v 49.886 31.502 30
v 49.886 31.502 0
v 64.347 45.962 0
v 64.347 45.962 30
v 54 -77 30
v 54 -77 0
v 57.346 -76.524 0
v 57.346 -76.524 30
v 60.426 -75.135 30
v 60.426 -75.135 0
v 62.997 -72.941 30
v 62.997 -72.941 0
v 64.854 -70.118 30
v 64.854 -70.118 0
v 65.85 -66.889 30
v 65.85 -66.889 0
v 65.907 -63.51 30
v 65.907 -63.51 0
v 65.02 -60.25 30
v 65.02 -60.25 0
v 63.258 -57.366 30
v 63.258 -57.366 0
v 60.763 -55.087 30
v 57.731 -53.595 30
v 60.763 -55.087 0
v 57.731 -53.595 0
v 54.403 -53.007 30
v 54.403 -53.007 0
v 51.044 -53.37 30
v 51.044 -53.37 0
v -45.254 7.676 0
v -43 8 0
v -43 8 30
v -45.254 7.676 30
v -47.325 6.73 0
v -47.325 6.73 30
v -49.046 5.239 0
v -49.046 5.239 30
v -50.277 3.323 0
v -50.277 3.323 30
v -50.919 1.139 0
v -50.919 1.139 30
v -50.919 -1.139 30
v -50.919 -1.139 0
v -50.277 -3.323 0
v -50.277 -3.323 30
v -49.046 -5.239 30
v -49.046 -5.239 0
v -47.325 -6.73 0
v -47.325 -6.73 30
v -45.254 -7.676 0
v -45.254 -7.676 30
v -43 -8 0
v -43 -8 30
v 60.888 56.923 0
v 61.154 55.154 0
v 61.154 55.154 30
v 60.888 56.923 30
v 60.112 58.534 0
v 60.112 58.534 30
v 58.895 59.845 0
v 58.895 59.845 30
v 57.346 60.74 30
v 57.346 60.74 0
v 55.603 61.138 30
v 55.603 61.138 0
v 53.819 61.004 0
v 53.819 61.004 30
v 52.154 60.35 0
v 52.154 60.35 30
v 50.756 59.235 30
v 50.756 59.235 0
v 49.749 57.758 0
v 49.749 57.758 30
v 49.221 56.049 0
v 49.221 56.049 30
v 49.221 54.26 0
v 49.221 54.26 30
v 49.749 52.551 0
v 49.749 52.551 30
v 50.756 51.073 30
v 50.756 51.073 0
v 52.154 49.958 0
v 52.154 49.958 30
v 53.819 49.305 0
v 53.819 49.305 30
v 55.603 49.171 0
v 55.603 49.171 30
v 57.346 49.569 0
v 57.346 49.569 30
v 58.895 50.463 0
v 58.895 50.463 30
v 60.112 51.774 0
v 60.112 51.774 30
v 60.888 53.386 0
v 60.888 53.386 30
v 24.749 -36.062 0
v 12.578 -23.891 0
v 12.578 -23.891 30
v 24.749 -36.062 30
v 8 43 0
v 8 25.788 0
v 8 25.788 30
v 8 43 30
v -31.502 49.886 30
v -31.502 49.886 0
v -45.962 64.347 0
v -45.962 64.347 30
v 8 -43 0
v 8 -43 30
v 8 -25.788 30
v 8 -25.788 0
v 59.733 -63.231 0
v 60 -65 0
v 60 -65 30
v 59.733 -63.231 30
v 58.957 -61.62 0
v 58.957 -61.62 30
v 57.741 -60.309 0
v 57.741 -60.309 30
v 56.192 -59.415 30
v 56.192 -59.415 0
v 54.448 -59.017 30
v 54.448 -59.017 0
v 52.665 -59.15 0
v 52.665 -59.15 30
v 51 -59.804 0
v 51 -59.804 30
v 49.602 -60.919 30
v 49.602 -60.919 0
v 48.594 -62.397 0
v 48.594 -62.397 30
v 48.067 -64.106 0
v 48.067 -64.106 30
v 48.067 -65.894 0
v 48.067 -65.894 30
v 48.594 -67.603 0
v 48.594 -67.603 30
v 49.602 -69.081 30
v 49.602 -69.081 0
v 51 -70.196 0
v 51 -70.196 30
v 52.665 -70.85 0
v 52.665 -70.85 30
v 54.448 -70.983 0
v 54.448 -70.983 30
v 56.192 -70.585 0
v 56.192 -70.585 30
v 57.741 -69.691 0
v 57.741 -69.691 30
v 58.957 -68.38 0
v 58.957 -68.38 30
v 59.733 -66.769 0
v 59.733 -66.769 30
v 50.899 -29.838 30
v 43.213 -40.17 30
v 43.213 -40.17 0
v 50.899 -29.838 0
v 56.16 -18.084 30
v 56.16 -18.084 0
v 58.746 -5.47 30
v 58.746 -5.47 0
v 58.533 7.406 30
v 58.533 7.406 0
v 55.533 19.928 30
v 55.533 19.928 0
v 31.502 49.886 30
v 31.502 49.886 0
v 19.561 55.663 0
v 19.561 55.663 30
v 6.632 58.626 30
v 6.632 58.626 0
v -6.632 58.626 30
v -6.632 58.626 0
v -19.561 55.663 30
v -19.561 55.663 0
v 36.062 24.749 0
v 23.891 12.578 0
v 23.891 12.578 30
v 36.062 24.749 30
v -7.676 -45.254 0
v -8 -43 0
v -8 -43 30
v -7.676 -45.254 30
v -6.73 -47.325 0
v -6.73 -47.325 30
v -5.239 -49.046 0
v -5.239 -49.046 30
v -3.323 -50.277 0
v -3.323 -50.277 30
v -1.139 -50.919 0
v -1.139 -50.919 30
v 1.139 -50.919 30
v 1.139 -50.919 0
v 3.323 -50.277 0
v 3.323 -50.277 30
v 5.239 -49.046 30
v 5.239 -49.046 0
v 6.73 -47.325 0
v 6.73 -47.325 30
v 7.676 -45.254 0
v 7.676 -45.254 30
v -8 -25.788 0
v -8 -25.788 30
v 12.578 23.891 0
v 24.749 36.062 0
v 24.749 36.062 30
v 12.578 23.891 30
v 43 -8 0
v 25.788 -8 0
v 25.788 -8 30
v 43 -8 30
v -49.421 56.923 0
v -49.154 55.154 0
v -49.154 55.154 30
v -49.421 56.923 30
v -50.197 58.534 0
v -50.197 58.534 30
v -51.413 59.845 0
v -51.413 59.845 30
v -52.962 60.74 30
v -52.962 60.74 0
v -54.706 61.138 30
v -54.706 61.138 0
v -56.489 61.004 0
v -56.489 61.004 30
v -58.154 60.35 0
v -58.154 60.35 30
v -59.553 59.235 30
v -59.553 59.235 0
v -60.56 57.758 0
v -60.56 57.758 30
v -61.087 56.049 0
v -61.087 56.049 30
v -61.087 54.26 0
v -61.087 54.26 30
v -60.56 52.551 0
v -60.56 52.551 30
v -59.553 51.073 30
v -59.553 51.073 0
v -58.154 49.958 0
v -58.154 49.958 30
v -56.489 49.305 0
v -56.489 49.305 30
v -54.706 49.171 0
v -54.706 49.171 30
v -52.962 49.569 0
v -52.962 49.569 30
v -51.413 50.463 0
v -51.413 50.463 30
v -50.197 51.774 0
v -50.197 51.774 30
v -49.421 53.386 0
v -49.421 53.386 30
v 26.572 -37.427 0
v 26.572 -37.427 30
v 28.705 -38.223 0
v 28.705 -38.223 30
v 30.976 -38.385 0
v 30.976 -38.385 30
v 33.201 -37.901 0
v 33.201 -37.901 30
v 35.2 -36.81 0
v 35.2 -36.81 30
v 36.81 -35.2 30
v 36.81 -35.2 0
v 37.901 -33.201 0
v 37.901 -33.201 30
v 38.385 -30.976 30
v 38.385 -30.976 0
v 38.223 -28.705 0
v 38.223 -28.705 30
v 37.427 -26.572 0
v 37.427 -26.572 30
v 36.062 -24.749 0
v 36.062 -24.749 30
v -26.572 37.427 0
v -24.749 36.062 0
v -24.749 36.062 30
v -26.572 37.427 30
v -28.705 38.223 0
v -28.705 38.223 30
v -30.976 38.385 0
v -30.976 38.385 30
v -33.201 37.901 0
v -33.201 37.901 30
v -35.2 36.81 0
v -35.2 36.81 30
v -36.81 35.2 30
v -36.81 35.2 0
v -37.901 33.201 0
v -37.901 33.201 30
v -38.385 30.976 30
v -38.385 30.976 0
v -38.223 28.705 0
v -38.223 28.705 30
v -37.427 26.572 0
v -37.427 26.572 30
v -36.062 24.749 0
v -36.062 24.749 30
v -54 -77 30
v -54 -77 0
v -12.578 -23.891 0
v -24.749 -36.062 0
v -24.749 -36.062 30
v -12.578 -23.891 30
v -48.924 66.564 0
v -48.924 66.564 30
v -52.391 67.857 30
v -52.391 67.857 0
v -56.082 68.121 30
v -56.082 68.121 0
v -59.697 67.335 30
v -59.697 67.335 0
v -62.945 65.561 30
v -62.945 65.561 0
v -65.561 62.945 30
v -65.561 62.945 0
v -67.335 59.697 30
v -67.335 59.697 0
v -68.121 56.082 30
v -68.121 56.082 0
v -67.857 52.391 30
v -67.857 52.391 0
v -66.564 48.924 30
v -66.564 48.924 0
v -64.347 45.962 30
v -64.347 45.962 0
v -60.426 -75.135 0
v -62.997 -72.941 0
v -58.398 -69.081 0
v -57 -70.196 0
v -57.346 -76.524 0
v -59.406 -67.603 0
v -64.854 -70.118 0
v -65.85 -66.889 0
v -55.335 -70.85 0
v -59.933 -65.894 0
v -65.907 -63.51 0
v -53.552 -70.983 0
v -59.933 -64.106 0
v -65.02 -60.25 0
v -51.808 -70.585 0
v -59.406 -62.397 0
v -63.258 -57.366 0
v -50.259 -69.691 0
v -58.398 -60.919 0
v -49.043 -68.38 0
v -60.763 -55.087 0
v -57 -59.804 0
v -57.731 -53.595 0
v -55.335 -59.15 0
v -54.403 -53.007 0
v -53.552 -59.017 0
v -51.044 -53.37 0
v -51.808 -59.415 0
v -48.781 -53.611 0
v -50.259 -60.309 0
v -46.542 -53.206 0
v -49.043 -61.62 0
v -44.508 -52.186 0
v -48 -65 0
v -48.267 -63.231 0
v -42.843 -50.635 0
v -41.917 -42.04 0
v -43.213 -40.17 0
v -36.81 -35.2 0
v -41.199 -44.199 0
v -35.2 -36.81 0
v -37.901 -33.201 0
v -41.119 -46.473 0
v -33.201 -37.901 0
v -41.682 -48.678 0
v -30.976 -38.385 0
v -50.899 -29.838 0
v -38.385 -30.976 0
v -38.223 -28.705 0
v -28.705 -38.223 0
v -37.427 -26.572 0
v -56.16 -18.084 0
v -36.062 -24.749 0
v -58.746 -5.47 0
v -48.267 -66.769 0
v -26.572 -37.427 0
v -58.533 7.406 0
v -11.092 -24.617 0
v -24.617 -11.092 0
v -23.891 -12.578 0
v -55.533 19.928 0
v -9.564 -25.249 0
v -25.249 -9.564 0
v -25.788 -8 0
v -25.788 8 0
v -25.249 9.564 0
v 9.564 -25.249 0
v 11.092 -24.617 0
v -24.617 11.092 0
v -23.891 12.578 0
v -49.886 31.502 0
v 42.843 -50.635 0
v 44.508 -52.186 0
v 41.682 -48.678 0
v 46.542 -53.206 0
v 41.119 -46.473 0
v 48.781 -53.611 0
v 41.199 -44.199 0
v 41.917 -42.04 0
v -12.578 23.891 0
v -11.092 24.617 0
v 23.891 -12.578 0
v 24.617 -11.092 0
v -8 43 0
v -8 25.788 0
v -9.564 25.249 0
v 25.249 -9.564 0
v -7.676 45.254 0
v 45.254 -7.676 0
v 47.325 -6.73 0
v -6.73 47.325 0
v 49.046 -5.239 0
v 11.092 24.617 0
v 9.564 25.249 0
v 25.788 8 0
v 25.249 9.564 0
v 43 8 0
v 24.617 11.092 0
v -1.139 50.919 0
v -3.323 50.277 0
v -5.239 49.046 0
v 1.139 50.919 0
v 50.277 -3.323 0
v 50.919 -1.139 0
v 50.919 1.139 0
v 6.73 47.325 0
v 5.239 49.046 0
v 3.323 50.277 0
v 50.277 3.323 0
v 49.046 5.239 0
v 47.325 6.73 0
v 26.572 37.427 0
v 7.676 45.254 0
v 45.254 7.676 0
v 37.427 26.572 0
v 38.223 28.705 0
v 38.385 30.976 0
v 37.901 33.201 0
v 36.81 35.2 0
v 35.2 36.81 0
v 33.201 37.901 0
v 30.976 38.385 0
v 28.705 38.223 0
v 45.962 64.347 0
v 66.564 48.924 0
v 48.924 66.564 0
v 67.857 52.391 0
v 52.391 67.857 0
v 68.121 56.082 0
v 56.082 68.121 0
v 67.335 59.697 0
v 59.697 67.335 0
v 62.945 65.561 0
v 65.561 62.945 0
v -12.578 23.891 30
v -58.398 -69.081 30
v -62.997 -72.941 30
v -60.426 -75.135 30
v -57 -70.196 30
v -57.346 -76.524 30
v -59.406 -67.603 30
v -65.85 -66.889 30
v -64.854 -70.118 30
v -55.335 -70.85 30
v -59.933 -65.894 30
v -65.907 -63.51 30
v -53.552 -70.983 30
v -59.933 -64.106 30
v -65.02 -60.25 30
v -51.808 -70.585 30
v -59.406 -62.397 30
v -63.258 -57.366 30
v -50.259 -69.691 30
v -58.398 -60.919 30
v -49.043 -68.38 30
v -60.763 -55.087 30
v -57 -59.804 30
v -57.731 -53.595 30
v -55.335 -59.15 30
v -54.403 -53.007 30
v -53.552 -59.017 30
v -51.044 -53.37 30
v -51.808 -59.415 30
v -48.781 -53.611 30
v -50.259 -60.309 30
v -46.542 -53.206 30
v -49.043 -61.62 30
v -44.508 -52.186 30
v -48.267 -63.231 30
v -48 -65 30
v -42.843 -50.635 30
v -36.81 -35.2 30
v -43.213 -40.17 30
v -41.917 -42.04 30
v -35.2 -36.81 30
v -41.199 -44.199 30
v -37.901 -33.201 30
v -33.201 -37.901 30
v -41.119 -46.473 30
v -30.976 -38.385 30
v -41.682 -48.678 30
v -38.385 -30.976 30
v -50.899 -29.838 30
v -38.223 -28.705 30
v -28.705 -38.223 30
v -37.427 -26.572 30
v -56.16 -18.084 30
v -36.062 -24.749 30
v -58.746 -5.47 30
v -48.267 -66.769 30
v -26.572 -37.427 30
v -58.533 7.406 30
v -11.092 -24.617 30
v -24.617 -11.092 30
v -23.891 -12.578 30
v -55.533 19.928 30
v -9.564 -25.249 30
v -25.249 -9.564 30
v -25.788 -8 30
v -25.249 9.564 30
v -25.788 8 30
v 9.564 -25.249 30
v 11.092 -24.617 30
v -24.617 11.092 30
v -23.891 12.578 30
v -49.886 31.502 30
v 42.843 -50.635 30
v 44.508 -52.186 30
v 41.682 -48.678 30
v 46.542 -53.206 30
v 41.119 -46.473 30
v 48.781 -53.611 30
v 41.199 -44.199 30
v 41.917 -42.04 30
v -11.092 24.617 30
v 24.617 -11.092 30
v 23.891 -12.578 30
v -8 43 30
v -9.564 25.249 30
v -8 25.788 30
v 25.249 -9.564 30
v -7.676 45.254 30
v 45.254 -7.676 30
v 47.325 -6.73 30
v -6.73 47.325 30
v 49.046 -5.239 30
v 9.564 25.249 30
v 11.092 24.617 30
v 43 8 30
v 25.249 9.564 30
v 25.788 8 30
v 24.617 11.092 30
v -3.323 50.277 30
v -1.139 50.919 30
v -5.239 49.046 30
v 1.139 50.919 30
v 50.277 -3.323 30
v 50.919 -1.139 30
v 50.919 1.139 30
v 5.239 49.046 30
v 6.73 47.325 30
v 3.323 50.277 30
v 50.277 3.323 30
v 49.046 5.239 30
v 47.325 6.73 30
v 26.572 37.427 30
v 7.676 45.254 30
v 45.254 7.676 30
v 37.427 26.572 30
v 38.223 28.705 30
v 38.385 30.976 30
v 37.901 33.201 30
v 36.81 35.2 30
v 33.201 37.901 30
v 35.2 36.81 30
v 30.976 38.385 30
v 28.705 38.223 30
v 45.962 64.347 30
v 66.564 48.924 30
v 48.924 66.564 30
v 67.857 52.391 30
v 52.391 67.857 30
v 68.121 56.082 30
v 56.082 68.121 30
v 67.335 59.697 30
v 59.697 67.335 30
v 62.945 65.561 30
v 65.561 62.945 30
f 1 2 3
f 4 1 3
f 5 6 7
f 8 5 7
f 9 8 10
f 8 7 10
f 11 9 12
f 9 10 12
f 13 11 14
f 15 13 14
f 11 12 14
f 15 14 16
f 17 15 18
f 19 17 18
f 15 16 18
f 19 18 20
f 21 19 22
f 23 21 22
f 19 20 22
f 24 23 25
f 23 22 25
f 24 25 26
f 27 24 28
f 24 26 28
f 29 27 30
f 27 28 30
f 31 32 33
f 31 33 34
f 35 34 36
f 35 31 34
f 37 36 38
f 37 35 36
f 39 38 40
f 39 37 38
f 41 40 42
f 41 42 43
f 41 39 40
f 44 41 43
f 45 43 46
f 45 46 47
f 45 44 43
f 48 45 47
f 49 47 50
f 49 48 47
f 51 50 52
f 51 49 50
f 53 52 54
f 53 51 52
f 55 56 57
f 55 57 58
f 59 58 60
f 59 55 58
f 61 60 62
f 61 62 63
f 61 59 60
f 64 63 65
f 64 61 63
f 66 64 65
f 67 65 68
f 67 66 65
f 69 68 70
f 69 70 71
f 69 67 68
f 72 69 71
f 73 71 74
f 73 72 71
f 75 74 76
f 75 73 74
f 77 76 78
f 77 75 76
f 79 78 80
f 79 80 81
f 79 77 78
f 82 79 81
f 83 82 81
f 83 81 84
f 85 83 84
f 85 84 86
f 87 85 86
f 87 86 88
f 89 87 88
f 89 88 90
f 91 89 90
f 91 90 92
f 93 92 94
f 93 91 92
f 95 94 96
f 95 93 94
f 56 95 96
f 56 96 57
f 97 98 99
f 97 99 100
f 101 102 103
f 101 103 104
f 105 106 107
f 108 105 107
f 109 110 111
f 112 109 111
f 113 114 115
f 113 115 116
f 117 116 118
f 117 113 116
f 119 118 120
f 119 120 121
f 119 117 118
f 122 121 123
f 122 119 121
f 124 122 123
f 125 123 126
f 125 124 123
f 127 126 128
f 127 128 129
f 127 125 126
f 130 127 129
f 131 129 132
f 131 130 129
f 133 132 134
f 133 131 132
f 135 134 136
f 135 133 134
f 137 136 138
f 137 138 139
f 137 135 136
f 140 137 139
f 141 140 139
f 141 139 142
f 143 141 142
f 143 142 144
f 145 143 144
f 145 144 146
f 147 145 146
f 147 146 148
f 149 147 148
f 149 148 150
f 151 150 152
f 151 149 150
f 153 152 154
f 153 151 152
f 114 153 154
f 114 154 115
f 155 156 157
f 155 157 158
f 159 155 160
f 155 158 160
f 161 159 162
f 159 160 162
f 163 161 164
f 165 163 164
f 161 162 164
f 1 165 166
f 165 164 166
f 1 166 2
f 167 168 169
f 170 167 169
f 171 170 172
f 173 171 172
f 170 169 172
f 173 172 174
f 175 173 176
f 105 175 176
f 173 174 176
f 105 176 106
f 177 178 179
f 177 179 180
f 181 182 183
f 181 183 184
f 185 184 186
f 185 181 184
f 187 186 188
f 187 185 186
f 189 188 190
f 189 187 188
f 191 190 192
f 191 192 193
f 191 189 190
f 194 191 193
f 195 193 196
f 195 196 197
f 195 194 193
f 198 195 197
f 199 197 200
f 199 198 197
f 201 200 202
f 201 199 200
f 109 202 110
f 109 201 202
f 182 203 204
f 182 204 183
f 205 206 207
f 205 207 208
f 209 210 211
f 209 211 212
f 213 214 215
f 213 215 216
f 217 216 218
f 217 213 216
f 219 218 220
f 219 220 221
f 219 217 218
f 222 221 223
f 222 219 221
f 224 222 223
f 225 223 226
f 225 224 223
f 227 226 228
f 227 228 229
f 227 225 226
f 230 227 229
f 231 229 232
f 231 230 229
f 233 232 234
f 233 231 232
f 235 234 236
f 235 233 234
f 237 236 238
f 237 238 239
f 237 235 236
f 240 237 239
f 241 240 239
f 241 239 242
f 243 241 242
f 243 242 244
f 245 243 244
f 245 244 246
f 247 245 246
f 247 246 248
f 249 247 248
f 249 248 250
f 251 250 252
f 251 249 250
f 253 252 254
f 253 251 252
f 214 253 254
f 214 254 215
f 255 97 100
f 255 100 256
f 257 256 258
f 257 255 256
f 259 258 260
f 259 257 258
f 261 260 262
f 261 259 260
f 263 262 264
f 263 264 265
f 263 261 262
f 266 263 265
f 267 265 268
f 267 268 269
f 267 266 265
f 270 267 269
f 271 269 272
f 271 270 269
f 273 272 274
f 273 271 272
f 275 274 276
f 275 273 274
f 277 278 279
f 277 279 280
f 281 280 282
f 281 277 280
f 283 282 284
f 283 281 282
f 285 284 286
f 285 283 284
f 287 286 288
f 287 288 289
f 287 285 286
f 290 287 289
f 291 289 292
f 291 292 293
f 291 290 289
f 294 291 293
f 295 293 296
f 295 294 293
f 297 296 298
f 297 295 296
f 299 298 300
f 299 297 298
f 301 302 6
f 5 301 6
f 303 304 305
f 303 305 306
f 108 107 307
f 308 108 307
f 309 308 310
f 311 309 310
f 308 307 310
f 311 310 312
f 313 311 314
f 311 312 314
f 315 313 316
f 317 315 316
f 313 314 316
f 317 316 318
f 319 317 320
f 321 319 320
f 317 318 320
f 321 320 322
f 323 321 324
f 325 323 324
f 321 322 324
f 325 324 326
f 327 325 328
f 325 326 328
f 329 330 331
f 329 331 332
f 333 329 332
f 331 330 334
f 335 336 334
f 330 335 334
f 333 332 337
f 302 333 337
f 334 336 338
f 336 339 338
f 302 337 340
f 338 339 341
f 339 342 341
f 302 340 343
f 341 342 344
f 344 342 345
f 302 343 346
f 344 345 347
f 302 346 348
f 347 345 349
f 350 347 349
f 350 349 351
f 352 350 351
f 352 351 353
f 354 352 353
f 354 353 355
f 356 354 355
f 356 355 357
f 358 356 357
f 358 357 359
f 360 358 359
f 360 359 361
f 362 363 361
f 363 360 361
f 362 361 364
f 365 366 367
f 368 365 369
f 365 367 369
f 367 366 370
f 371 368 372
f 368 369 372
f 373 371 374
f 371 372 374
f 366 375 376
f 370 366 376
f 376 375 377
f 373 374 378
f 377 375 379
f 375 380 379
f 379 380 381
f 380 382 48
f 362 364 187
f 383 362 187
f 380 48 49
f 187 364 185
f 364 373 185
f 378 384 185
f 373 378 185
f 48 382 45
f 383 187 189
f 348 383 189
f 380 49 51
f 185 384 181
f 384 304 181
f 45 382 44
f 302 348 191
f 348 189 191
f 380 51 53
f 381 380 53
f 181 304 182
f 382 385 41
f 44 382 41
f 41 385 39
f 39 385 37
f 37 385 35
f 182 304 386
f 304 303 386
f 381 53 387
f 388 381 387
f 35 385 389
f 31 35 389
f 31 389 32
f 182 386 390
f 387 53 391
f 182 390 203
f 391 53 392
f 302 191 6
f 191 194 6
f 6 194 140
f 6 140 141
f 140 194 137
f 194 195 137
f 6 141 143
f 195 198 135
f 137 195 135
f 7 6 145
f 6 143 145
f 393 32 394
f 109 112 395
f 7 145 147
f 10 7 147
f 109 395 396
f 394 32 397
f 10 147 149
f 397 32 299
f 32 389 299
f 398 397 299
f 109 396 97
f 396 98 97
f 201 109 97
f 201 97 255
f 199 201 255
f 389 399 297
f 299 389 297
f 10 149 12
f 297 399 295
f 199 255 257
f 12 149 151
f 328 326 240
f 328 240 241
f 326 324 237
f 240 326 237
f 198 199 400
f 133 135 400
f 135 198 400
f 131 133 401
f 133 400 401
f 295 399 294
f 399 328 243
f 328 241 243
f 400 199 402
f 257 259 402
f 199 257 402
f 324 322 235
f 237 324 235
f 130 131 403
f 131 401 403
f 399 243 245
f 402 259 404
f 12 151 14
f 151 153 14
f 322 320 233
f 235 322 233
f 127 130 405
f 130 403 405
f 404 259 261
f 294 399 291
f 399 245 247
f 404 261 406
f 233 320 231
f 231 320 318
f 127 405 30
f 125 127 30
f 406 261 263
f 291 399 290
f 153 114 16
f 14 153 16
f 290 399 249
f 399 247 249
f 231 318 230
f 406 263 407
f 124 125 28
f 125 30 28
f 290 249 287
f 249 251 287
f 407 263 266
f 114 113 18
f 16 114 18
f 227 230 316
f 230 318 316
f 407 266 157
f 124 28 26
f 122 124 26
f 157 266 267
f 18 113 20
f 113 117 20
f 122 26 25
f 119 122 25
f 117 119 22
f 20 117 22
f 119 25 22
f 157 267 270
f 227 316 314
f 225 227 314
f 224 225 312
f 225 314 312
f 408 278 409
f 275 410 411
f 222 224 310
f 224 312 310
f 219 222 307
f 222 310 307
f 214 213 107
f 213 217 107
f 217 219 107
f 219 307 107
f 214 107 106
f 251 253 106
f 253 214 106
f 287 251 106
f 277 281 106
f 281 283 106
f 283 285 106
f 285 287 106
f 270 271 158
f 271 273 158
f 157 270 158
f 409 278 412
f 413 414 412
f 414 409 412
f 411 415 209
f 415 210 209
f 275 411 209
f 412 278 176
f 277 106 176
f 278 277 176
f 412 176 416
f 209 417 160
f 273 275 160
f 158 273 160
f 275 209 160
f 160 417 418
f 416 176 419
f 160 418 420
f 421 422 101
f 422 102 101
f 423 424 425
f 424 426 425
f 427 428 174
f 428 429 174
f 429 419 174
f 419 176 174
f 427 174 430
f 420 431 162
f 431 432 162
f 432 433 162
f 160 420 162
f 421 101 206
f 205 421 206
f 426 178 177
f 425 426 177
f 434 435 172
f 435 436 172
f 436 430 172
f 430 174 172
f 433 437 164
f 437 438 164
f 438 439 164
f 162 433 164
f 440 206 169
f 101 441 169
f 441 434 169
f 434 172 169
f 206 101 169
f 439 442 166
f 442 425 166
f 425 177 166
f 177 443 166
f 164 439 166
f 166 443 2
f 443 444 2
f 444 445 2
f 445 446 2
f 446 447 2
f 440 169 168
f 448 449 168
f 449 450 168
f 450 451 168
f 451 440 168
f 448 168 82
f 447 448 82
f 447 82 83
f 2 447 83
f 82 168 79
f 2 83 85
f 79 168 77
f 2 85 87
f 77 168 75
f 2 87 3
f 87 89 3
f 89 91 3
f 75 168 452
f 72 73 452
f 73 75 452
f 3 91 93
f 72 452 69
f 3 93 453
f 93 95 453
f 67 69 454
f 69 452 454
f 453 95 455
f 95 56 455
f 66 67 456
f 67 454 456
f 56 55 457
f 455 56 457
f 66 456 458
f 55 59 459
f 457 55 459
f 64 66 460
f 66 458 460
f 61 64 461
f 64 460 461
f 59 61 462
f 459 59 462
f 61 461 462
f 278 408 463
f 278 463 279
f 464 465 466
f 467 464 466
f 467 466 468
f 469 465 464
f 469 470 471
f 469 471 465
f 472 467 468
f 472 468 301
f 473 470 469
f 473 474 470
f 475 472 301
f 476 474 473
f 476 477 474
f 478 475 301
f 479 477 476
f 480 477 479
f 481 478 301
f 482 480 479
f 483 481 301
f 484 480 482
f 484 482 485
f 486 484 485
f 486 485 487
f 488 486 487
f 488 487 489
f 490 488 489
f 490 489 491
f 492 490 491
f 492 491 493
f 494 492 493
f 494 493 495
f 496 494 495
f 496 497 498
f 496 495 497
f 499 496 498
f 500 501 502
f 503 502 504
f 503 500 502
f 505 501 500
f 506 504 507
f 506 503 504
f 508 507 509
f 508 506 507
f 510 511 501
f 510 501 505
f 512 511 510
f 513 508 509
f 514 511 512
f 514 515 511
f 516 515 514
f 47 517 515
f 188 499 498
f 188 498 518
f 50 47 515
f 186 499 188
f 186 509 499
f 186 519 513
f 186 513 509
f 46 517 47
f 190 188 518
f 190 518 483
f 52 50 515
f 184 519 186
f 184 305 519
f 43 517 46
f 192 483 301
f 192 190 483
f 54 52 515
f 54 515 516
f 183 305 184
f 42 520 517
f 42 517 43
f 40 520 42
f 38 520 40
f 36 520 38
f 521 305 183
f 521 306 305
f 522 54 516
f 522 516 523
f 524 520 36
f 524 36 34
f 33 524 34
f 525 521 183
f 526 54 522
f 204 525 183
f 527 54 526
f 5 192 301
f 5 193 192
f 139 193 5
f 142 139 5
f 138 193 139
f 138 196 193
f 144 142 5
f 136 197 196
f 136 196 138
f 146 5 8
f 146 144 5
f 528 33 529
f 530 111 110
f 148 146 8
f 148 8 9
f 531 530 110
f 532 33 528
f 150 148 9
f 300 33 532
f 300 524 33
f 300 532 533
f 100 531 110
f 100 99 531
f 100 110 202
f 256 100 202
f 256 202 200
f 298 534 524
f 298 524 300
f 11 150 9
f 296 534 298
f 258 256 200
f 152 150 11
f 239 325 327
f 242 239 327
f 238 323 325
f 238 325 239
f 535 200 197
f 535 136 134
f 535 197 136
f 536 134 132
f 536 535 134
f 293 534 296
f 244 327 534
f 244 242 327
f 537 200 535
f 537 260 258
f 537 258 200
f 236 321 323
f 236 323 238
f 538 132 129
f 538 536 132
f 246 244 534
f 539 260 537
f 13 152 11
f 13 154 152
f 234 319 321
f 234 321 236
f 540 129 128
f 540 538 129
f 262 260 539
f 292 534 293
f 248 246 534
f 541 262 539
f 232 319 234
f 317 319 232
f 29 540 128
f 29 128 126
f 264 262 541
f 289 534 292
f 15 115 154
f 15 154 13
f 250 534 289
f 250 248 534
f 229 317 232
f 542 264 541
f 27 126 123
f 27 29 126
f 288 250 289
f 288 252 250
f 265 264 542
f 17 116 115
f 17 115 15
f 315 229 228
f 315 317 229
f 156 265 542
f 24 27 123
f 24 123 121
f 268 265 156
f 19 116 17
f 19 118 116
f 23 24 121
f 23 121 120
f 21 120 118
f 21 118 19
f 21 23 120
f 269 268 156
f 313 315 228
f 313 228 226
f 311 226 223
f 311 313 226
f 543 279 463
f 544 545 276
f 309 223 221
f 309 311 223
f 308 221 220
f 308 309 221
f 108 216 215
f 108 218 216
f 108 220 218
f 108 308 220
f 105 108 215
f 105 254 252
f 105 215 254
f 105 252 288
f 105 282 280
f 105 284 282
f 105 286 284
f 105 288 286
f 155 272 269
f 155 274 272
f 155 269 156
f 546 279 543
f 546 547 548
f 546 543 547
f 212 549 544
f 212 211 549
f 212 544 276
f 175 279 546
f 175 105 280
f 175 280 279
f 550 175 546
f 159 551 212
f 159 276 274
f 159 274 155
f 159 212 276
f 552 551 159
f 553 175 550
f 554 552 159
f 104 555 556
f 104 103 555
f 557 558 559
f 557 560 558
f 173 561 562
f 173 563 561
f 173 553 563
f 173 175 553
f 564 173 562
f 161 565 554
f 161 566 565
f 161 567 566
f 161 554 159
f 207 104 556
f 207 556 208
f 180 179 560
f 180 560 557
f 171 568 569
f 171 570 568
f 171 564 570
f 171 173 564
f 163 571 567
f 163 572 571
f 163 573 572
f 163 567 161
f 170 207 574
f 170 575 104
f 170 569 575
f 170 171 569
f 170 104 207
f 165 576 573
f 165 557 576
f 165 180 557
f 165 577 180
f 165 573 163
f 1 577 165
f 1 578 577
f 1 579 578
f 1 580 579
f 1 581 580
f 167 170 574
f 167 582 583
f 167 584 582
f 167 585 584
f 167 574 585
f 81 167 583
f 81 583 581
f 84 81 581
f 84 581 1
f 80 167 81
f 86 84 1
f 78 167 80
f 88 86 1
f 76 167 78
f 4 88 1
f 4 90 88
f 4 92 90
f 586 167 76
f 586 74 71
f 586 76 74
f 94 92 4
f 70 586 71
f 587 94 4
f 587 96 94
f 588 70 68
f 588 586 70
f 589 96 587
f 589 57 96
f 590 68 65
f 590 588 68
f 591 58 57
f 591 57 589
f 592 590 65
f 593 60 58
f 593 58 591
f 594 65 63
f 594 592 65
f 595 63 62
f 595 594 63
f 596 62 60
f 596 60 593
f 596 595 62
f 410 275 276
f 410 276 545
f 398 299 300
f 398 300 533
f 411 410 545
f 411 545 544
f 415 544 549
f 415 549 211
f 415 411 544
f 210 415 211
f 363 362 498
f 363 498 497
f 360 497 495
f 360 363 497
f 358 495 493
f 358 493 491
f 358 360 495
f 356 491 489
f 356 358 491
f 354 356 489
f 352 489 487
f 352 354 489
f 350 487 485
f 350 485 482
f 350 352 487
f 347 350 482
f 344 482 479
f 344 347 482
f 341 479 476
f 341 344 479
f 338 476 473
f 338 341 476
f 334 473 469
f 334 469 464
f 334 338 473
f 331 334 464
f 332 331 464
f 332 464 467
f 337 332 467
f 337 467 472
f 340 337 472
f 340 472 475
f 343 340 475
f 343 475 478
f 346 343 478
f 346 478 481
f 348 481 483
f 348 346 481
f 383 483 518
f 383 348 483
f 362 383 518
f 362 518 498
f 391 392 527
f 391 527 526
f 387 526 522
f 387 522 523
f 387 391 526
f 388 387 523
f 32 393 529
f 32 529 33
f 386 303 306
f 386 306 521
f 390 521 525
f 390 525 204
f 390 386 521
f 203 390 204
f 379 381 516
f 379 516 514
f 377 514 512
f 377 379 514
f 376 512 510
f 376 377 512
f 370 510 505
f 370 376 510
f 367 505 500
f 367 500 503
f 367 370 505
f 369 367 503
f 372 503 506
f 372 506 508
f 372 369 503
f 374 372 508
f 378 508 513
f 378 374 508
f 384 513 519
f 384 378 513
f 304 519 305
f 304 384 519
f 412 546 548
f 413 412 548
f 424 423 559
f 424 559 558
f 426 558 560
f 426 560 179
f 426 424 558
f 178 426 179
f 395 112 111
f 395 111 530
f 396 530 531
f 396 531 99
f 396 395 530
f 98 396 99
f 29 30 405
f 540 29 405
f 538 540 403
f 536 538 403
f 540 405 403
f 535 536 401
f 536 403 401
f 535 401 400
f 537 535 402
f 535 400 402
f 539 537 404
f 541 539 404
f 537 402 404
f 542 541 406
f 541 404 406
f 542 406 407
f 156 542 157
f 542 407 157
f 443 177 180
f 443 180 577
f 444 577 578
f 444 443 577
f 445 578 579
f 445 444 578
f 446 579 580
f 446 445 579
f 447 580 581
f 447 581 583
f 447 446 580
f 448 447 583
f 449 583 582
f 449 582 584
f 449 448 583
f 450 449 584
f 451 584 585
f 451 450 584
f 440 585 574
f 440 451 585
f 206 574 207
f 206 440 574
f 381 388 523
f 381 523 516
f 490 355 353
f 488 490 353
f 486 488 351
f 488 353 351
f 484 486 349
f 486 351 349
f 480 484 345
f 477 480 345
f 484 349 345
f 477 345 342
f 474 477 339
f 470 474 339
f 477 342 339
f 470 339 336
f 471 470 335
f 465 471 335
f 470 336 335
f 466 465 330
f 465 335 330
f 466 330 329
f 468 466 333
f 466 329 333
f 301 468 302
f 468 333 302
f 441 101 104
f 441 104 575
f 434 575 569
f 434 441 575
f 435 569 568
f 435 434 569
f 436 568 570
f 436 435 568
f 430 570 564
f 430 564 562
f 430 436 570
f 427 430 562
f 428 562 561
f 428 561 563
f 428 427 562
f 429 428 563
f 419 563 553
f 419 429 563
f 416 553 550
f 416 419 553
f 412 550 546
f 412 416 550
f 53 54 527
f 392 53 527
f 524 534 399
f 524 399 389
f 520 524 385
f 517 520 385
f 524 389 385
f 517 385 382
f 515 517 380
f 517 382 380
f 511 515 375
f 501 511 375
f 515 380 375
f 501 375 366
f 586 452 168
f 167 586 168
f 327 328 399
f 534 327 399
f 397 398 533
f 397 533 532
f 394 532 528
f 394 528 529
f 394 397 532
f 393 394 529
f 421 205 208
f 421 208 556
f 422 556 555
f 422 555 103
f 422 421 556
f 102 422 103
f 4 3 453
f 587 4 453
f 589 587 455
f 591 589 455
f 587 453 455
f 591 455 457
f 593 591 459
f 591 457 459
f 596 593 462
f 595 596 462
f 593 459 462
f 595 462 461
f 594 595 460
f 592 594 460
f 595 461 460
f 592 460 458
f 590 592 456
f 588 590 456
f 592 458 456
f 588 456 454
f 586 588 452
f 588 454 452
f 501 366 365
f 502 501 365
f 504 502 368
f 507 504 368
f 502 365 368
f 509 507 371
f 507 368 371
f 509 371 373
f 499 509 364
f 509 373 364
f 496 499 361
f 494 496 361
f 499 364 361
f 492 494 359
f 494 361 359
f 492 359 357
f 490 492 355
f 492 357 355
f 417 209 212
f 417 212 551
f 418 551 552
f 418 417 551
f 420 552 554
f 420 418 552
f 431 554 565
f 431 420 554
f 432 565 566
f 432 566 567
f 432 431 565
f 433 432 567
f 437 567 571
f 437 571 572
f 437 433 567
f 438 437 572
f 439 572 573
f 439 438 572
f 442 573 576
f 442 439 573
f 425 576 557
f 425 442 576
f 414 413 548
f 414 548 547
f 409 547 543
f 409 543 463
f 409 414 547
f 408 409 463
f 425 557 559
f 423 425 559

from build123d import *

# Parameters (mm, degrees)
CROQUIS1_R              = 6
SALIENTE_EXTRUIR2_DEPTH = 30


with BuildPart() as part:
    # Croquis1 → Saliente-Extruir2 (new body)
    # profile 1 of 2: a face of its own
    with BuildSketch(Plane.XY):
        with BuildLine():
            Line((45.961940777, 64.346717088), (31.501591743, 49.886368054))
            ThreePointArc((31.501591743, 49.886368054), (0, 59), (-31.501591743, 49.886368054))
            Line((-31.501591743, 49.886368054), (-45.961940777, 64.346717088))
            ThreePointArc((-45.961940777, 64.346717088), (-64.346717088, 64.346717088), (-64.346717088, 45.961940777))
            Line((-64.346717088, 45.961940777), (-49.886368054, 31.501591743))
            ThreePointArc((-49.886368054, 31.501591743), (0, -59), (49.886368054, 31.501591743))
            Line((49.886368054, 31.501591743), (64.346717088, 45.961940777))
            ThreePointArc((64.346717088, 45.961940777), (64.346717088, 64.346717088), (45.961940777, 64.346717088))
        make_face()
        with Locations((55.154328933, 55.154328933)):
            Circle(CROQUIS1_R, mode=Mode.SUBTRACT)
        with Locations((-55.154328933, 55.154328933)):
            Circle(CROQUIS1_R, mode=Mode.SUBTRACT)
        with BuildLine():
            ThreePointArc((12.577728279, 23.891436778), (10.332452674, 24.944747378), (8, 25.787593916))
            Line((8, 25.787593916), (8, 43))
            ThreePointArc((8, 43), (0, 51), (-8, 43))
            Line((-8, 43), (-8, 25.787593916))
            ThreePointArc((-8, 25.787593916), (-10.332452674, 24.944747378), (-12.577728279, 23.891436778))
            Line((-12.577728279, 23.891436778), (-24.748737342, 36.062445841))
            ThreePointArc((-24.748737342, 36.062445841), (-36.062445841, 36.062445841), (-36.062445841, 24.748737342))
            Line((-36.062445841, 24.748737342), (-23.891436778, 12.577728279))
            ThreePointArc((-23.891436778, 12.577728279), (-24.944747378, 10.332452674), (-25.787593916, 8))
            Line((-25.787593916, 8), (-43, 8))
            ThreePointArc((-43, 8), (-51, 0), (-43, -8))
            Line((-43, -8), (-25.787593916, -8))
            ThreePointArc((-25.787593916, -8), (-24.944747378, -10.332452674), (-23.891436778, -12.577728279))
            Line((-23.891436778, -12.577728279), (-36.062445841, -24.748737342))
            ThreePointArc((-36.062445841, -24.748737342), (-36.062445841, -36.062445841), (-24.748737342, -36.062445841))
            Line((-24.748737342, -36.062445841), (-12.577728279, -23.891436778))
            ThreePointArc((-12.577728279, -23.891436778), (-10.332452674, -24.944747378), (-8, -25.787593916))
            Line((-8, -25.787593916), (-8, -43))
            ThreePointArc((-8, -43), (0, -51), (8, -43))
            Line((8, -43), (8, -25.787593916))
            ThreePointArc((8, -25.787593916), (10.332452674, -24.944747378), (12.577728279, -23.891436778))
            Line((12.577728279, -23.891436778), (24.748737342, -36.062445841))
            ThreePointArc((24.748737342, -36.062445841), (36.062445841, -36.062445841), (36.062445841, -24.748737342))
            Line((36.062445841, -24.748737342), (23.891436778, -12.577728279))
            ThreePointArc((23.891436778, -12.577728279), (24.944747378, -10.332452674), (25.787593916, -8))
            Line((25.787593916, -8), (43, -8))
            ThreePointArc((43, -8), (51, 0), (43, 8))
            Line((43, 8), (25.787593916, 8))
            ThreePointArc((25.787593916, 8), (24.944747378, 10.332452674), (23.891436778, 12.577728279))
            Line((23.891436778, 12.577728279), (36.062445841, 24.748737342))
            ThreePointArc((36.062445841, 24.748737342), (36.062445841, 36.062445841), (24.748737342, 36.062445841))
            Line((24.748737342, 36.062445841), (12.577728279, 23.891436778))
        make_face(mode=Mode.SUBTRACT)
    # profile 2 of 2: a face of its own
    with BuildSketch(Plane.XY):
        with BuildLine():
            ThreePointArc((43.213377787, -40.16968982), (0, -59), (-43.213377787, -40.16968982))
            ThreePointArc((-43.213377787, -40.16968982), (-42.192314412, -49.697929449), (-51.043691305, -53.369856454))
            ThreePointArc((-51.043691305, -53.369856454), (-65.907176881, -63.510322611), (-54, -77))
            Line((-54, -77), (-0.009258466, -77))
            Line((-0.009258466, -77), (0.009258466, -77))
            Line((0.009258466, -77), (54, -77))
            ThreePointArc((54, -77), (65.907176881, -63.510322611), (51.043691305, -53.369856454))
            ThreePointArc((51.043691305, -53.369856454), (42.192314412, -49.697929449), (43.213377787, -40.16968982))
        make_face()
        with Locations((-54, -65)):
            Circle(CROQUIS1_R, mode=Mode.SUBTRACT)
        with Locations((54, -65)):
            Circle(CROQUIS1_R, mode=Mode.SUBTRACT)
    extrude(amount=SALIENTE_EXTRUIR2_DEPTH)


solid = part.part
